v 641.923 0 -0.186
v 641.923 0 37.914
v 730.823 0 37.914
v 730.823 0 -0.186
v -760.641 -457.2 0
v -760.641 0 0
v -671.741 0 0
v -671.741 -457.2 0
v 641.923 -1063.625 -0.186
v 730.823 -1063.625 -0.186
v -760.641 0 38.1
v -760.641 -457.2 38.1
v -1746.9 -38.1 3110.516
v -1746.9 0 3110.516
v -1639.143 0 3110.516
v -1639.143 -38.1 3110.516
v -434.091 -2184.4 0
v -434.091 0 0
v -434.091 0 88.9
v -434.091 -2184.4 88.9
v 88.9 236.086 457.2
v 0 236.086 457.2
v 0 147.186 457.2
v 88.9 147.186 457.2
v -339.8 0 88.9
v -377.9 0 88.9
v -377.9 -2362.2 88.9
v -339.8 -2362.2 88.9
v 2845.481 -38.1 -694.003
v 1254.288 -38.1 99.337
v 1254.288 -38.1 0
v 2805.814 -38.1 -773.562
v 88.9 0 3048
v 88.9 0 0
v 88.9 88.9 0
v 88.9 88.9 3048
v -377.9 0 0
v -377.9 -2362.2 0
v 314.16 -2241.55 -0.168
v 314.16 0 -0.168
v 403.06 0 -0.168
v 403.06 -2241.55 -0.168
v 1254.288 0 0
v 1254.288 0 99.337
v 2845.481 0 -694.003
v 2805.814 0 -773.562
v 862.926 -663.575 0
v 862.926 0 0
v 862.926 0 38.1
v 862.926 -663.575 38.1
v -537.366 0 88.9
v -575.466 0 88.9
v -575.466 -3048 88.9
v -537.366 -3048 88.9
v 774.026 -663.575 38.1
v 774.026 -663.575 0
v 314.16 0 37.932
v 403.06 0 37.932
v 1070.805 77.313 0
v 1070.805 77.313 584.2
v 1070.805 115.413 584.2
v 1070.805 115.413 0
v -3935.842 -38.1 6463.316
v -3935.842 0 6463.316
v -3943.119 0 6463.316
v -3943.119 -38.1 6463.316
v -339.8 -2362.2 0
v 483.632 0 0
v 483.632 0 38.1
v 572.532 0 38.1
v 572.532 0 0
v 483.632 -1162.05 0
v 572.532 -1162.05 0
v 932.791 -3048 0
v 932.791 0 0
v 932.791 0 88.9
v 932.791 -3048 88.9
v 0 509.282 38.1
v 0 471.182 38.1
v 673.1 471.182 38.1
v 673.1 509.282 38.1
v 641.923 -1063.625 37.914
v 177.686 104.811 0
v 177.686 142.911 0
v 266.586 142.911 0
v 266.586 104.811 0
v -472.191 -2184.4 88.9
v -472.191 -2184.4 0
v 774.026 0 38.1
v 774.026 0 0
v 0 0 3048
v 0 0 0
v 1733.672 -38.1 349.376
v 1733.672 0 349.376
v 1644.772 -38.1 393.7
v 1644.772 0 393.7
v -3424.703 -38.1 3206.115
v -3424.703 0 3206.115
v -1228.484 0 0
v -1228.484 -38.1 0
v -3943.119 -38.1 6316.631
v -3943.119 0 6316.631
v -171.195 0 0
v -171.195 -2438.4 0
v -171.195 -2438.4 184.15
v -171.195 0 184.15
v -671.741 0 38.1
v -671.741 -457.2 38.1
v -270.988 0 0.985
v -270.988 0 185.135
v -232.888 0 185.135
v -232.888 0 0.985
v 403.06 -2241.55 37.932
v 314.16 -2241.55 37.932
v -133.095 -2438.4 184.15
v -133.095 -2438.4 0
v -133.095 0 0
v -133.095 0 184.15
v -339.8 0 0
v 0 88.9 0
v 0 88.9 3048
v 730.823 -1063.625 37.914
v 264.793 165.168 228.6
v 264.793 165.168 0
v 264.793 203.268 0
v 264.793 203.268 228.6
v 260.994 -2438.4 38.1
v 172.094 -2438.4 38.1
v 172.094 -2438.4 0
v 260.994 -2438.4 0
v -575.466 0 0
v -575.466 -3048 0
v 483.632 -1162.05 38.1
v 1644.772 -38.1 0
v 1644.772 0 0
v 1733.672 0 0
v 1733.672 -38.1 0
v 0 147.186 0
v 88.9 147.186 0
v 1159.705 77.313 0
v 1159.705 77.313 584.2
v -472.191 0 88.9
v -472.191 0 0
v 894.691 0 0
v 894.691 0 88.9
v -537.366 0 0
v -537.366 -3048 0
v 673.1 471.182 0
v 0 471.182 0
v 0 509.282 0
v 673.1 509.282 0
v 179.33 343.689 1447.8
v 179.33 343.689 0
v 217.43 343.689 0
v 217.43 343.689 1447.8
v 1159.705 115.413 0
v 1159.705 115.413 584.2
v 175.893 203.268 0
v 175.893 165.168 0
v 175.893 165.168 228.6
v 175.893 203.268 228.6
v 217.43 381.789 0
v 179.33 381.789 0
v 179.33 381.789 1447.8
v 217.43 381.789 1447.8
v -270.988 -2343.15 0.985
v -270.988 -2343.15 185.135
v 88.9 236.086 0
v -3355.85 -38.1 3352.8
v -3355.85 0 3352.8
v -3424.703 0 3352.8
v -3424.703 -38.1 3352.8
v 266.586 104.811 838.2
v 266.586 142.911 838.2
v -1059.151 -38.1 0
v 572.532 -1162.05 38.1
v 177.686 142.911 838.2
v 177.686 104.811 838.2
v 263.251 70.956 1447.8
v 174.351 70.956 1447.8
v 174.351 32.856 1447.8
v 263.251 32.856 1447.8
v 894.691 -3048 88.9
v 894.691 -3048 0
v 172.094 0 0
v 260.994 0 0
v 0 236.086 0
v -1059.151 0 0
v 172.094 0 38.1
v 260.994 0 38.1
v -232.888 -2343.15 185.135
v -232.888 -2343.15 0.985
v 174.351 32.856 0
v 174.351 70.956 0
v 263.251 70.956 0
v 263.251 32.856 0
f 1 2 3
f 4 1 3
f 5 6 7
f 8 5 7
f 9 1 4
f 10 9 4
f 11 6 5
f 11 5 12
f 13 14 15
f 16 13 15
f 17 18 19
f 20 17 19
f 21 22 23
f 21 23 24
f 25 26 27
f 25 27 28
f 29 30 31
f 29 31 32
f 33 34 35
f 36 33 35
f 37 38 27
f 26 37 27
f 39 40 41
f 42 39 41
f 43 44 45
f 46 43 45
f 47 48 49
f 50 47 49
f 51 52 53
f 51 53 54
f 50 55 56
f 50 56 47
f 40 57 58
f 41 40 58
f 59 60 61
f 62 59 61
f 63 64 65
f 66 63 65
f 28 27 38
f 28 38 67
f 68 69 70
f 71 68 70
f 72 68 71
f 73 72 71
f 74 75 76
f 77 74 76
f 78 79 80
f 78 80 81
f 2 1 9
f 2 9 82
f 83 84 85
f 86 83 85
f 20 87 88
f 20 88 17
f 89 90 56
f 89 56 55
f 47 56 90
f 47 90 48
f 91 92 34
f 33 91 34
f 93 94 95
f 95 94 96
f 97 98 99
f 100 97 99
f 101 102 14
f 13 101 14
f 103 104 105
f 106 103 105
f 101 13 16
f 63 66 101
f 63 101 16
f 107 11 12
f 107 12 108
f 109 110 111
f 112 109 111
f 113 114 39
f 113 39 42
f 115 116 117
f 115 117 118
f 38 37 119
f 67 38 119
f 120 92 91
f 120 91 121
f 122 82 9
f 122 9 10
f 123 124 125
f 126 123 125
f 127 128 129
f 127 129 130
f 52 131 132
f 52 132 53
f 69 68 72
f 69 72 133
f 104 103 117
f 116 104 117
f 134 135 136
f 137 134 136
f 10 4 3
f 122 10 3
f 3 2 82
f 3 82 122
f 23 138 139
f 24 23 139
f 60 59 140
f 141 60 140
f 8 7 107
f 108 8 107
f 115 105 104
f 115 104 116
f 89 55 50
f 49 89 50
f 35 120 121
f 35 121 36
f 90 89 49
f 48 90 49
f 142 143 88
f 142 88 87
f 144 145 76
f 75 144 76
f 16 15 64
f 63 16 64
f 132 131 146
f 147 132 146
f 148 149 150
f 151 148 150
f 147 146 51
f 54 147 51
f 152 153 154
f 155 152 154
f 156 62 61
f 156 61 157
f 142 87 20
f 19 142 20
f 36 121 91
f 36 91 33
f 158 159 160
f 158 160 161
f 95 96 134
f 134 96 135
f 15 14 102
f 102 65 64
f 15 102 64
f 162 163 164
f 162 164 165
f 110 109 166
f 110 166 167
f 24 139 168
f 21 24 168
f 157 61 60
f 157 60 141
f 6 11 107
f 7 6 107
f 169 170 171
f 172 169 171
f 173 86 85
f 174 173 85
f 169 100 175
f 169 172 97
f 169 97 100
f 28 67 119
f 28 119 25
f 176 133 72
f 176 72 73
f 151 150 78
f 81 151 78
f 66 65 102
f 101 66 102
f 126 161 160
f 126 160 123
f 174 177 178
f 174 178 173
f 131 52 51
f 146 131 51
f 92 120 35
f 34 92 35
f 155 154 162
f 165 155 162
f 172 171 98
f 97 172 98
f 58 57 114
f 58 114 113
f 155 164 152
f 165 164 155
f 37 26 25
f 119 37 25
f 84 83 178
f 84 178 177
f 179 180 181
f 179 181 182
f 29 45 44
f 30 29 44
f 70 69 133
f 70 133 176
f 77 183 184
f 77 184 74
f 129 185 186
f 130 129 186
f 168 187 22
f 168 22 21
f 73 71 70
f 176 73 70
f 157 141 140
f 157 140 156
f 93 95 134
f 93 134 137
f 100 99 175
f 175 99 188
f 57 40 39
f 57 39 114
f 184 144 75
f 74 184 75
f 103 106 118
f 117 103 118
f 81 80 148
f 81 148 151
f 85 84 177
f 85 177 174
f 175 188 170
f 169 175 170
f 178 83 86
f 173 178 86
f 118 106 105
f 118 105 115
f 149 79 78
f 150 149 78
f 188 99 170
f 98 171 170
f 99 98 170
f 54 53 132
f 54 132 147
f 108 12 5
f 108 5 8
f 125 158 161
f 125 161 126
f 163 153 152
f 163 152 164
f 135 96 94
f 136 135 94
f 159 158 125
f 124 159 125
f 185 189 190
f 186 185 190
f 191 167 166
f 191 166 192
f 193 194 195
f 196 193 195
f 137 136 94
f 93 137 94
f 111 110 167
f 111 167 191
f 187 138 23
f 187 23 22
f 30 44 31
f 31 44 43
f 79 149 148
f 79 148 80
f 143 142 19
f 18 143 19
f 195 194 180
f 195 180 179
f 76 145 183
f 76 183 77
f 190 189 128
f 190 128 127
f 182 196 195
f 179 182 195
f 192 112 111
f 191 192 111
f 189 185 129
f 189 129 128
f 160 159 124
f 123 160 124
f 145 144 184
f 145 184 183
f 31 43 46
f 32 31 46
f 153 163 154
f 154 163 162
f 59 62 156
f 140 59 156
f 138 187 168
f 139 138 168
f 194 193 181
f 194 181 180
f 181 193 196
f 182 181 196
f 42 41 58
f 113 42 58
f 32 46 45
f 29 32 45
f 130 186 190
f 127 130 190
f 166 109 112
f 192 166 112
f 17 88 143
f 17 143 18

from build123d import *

# Parameters (mm, degrees)
F0_W      = 88.9
F0_H      = 88.9
F1_DEPTH  = 3048
F2_W      = 38.1
F2_H      = 184.15
F3_DEPTH  = 2438.4
F4_W      = 38.1
F4_H      = 184.15
F5_DEPTH  = 2343.15
F6_W      = 38.1
F6_H      = 88.9
F7_DEPTH  = 2362.2
F8_W      = 38.1
F8_H      = 88.9
F9_DEPTH  = 2184.4
F10_W     = 38.1
F10_H     = 88.9
F11_DEPTH = 3048
F12_W     = 88.9
F12_H     = 38.1
F13_DEPTH = 2438.4
F14_W     = 88.9
F14_H     = 38.1
F15_DEPTH = 1447.8
F16_W     = 88.9
F16_H     = 38.1
F17_DEPTH = 2241.55
F18_W     = 88.9
F18_H     = 38.1
F19_DEPTH = 1162.05
F20_W     = 88.9
F20_H     = 38.1
F21_DEPTH = 1063.625
F22_W     = 88.9
F22_H     = 38.1
F23_DEPTH = 838.2
F24_W     = 88.9
F24_H     = 38.1
F25_DEPTH = 228.6
F26_W     = 38.1
F26_H     = 88.9
F27_DEPTH = 3048
F29_DEPTH = 38.1
F30_W     = 88.9
F30_H     = 38.1
F31_DEPTH = 584.2
F33_DEPTH = 38.1
F34_W     = 38.1
F34_H     = 38.1
F35_DEPTH = 1447.8
F36_W     = 38.1
F36_H     = 38.1
F37_DEPTH = 673.1
F38_W     = 88.9
F38_H     = 38.1
F39_DEPTH = 663.575
F41_DEPTH = 38.1
F42_W     = 88.9
F42_H     = 88.9
F43_DEPTH = 457.2
F44_W     = 88.9
F44_H     = 38.1
F45_DEPTH = 457.2
F47_DEPTH = 38.1


with BuildPart() as f1:
    # F0 (on Top) → F1 (new body)
    with BuildSketch(Plane.XY):
        with Locations((44.45, 44.45)):
            Rectangle(F0_W, F0_H)
    extrude(amount=F1_DEPTH)


with BuildPart() as f3:
    # F2 (on Front) → F3 (new body)
    with BuildSketch(Plane.XZ):
        with Locations((-152.145111, 92.075)):
            Rectangle(F2_W, F2_H)
    extrude(amount=F3_DEPTH)


with BuildPart() as f5:
    # F4 (on Front) → F5 (new body)
    with BuildSketch(Plane.XZ):
        with Locations((-251.938462, 93.059584)):
            Rectangle(F4_W, F4_H)
    extrude(amount=F5_DEPTH)


with BuildPart() as f7:
    # F6 (on Front) → F7 (new body)
    with BuildSketch(Plane.XZ):
        with Locations((-358.850423, 44.45)):
            Rectangle(F6_W, F6_H)
    extrude(amount=F7_DEPTH)


with BuildPart() as f9:
    # F8 (on Front) → F9 (new body)
    with BuildSketch(Plane.XZ):
        with Locations((-453.140585, 44.45)):
            Rectangle(F8_W, F8_H)
    extrude(amount=F9_DEPTH)


with BuildPart() as f11:
    # F10 (on Front) → F11 (new body)
    with BuildSketch(Plane.XZ):
        with Locations((-556.416263, 44.45)):
            Rectangle(F10_W, F10_H)
    extrude(amount=F11_DEPTH)


with BuildPart() as f13:
    # F12 (on Front) → F13 (new body)
    with BuildSketch(Plane.XZ):
        with Locations((216.543773, 19.05)):
            Rectangle(F12_W, F12_H)
    extrude(amount=F13_DEPTH)


with BuildPart() as f15:
    # F14 (on Top) → F15 (new body)
    with BuildSketch(Plane.XY):
        with Locations((218.800828, 51.906373)):
            Rectangle(F14_W, F14_H)
    extrude(amount=F15_DEPTH)


with BuildPart() as f17:
    # F16 (on Front) → F17 (new body)
    with BuildSketch(Plane.XZ):
        with Locations((358.610243, 18.882283)):
            Rectangle(F16_W, F16_H)
    extrude(amount=F17_DEPTH)


with BuildPart() as f19:
    # F18 (on Front) → F19 (new body)
    with BuildSketch(Plane.XZ):
        with Locations((528.082251, 19.05)):
            Rectangle(F18_W, F18_H)
    extrude(amount=F19_DEPTH)


with BuildPart() as f21:
    # F20 (on Front) → F21 (new body)
    with BuildSketch(Plane.XZ):
        with Locations((686.372936, 18.864415)):
            Rectangle(F20_W, F20_H)
    extrude(amount=F21_DEPTH)


with BuildPart() as f23:
    # F22 (on Top) → F23 (new body)
    with BuildSketch(Plane.XY):
        with Locations((222.136453, 123.861335)):
            Rectangle(F22_W, F22_H)
    extrude(amount=F23_DEPTH)


with BuildPart() as f25:
    # F24 (on Top) → F25 (new body)
    with BuildSketch(Plane.XY):
        with Locations((220.343396, 184.217587)):
            Rectangle(F24_W, F24_H)
    extrude(amount=F25_DEPTH)


with BuildPart() as f27:
    # F26 (on Front) → F27 (new body)
    with BuildSketch(Plane.XZ):
        with Locations((913.741173, 44.45)):
            Rectangle(F26_W, F26_H)
    extrude(amount=F27_DEPTH)


with BuildPart() as f29:
    # F28 (on Front) → F29 (new body)
    with BuildSketch(Plane.XZ):
        Polygon((1254.287944, 99.336894), (1254.287944, 0), (2805.814253, -773.562482), (2845.481239, -694.002818), align=None)
    extrude(amount=F29_DEPTH)


with BuildPart() as f31:
    # F30 (on Top) → F31 (new body)
    with BuildSketch(Plane.XY):
        with Locations((1115.254879, 96.363492)):
            Rectangle(F30_W, F30_H)
    extrude(amount=F31_DEPTH)


with BuildPart() as f33:
    # F32 (on Front) → F33 (new body)
    with BuildSketch(Plane.XZ):
        Polygon((1644.772301, 393.7), (1644.772301, 0), (1733.672301, 0), (1733.672301, 349.376095), align=None)
    extrude(amount=F33_DEPTH)


with BuildPart() as f35:
    # F34 (on Top) → F35 (new body)
    with BuildSketch(Plane.XY):
        with Locations((198.38018, 362.738583)):
            Rectangle(F34_W, F34_H)
    extrude(amount=F35_DEPTH)


with BuildPart() as f37:
    # F36 (on Right) → F37 (new body)
    with BuildSketch(Plane.YZ):
        with Locations((490.231836, 19.05)):
            Rectangle(F36_W, F36_H)
    extrude(amount=F37_DEPTH)


with BuildPart() as f39:
    # F38 (on Front) → F39 (new body)
    with BuildSketch(Plane.XZ):
        with Locations((818.476231, 19.05)):
            Rectangle(F38_W, F38_H)
    extrude(amount=F39_DEPTH)


with BuildPart() as f41:
    # F40 (on Front) → F41 (new body)
    with BuildSketch(Plane.XZ):
        Polygon((-1228.48423, 0), (-1059.150897, 0), (-3355.850302, 3352.8), (-3424.703037, 3352.8), (-3424.703037, 3206.115), align=None)
    extrude(amount=F41_DEPTH)


with BuildPart() as f43:
    # F42 (on Top) → F43 (new body)
    with BuildSketch(Plane.XY):
        with Locations((44.45, 191.636031)):
            Rectangle(F42_W, F42_H)
    extrude(amount=F43_DEPTH)


with BuildPart() as f45:
    # F44 (on Front) → F45 (new body)
    with BuildSketch(Plane.XZ):
        with Locations((-716.190782, 19.05)):
            Rectangle(F44_W, F44_H)
    extrude(amount=F45_DEPTH)


with BuildPart() as f47:
    # F46 (on Front) → F47 (new body)
    with BuildSketch(Plane.XZ):
        Polygon((-1746.900376, 3110.51608), (-1639.1428, 3110.51608), (-3935.842205, 6463.31608), (-3943.119182, 6463.31608), (-3943.119182, 6316.63108), align=None)
    extrude(amount=F47_DEPTH)


solid = Compound([f1.part, f3.part, f5.part, f7.part, f9.part, f11.part, f13.part, f15.part, f17.part, f19.part, f21.part, f23.part, f25.part, f27.part, f29.part, f31.part, f33.part, f35.part, f37.part, f39.part, f41.part, f43.part, f45.part, f47.part])
